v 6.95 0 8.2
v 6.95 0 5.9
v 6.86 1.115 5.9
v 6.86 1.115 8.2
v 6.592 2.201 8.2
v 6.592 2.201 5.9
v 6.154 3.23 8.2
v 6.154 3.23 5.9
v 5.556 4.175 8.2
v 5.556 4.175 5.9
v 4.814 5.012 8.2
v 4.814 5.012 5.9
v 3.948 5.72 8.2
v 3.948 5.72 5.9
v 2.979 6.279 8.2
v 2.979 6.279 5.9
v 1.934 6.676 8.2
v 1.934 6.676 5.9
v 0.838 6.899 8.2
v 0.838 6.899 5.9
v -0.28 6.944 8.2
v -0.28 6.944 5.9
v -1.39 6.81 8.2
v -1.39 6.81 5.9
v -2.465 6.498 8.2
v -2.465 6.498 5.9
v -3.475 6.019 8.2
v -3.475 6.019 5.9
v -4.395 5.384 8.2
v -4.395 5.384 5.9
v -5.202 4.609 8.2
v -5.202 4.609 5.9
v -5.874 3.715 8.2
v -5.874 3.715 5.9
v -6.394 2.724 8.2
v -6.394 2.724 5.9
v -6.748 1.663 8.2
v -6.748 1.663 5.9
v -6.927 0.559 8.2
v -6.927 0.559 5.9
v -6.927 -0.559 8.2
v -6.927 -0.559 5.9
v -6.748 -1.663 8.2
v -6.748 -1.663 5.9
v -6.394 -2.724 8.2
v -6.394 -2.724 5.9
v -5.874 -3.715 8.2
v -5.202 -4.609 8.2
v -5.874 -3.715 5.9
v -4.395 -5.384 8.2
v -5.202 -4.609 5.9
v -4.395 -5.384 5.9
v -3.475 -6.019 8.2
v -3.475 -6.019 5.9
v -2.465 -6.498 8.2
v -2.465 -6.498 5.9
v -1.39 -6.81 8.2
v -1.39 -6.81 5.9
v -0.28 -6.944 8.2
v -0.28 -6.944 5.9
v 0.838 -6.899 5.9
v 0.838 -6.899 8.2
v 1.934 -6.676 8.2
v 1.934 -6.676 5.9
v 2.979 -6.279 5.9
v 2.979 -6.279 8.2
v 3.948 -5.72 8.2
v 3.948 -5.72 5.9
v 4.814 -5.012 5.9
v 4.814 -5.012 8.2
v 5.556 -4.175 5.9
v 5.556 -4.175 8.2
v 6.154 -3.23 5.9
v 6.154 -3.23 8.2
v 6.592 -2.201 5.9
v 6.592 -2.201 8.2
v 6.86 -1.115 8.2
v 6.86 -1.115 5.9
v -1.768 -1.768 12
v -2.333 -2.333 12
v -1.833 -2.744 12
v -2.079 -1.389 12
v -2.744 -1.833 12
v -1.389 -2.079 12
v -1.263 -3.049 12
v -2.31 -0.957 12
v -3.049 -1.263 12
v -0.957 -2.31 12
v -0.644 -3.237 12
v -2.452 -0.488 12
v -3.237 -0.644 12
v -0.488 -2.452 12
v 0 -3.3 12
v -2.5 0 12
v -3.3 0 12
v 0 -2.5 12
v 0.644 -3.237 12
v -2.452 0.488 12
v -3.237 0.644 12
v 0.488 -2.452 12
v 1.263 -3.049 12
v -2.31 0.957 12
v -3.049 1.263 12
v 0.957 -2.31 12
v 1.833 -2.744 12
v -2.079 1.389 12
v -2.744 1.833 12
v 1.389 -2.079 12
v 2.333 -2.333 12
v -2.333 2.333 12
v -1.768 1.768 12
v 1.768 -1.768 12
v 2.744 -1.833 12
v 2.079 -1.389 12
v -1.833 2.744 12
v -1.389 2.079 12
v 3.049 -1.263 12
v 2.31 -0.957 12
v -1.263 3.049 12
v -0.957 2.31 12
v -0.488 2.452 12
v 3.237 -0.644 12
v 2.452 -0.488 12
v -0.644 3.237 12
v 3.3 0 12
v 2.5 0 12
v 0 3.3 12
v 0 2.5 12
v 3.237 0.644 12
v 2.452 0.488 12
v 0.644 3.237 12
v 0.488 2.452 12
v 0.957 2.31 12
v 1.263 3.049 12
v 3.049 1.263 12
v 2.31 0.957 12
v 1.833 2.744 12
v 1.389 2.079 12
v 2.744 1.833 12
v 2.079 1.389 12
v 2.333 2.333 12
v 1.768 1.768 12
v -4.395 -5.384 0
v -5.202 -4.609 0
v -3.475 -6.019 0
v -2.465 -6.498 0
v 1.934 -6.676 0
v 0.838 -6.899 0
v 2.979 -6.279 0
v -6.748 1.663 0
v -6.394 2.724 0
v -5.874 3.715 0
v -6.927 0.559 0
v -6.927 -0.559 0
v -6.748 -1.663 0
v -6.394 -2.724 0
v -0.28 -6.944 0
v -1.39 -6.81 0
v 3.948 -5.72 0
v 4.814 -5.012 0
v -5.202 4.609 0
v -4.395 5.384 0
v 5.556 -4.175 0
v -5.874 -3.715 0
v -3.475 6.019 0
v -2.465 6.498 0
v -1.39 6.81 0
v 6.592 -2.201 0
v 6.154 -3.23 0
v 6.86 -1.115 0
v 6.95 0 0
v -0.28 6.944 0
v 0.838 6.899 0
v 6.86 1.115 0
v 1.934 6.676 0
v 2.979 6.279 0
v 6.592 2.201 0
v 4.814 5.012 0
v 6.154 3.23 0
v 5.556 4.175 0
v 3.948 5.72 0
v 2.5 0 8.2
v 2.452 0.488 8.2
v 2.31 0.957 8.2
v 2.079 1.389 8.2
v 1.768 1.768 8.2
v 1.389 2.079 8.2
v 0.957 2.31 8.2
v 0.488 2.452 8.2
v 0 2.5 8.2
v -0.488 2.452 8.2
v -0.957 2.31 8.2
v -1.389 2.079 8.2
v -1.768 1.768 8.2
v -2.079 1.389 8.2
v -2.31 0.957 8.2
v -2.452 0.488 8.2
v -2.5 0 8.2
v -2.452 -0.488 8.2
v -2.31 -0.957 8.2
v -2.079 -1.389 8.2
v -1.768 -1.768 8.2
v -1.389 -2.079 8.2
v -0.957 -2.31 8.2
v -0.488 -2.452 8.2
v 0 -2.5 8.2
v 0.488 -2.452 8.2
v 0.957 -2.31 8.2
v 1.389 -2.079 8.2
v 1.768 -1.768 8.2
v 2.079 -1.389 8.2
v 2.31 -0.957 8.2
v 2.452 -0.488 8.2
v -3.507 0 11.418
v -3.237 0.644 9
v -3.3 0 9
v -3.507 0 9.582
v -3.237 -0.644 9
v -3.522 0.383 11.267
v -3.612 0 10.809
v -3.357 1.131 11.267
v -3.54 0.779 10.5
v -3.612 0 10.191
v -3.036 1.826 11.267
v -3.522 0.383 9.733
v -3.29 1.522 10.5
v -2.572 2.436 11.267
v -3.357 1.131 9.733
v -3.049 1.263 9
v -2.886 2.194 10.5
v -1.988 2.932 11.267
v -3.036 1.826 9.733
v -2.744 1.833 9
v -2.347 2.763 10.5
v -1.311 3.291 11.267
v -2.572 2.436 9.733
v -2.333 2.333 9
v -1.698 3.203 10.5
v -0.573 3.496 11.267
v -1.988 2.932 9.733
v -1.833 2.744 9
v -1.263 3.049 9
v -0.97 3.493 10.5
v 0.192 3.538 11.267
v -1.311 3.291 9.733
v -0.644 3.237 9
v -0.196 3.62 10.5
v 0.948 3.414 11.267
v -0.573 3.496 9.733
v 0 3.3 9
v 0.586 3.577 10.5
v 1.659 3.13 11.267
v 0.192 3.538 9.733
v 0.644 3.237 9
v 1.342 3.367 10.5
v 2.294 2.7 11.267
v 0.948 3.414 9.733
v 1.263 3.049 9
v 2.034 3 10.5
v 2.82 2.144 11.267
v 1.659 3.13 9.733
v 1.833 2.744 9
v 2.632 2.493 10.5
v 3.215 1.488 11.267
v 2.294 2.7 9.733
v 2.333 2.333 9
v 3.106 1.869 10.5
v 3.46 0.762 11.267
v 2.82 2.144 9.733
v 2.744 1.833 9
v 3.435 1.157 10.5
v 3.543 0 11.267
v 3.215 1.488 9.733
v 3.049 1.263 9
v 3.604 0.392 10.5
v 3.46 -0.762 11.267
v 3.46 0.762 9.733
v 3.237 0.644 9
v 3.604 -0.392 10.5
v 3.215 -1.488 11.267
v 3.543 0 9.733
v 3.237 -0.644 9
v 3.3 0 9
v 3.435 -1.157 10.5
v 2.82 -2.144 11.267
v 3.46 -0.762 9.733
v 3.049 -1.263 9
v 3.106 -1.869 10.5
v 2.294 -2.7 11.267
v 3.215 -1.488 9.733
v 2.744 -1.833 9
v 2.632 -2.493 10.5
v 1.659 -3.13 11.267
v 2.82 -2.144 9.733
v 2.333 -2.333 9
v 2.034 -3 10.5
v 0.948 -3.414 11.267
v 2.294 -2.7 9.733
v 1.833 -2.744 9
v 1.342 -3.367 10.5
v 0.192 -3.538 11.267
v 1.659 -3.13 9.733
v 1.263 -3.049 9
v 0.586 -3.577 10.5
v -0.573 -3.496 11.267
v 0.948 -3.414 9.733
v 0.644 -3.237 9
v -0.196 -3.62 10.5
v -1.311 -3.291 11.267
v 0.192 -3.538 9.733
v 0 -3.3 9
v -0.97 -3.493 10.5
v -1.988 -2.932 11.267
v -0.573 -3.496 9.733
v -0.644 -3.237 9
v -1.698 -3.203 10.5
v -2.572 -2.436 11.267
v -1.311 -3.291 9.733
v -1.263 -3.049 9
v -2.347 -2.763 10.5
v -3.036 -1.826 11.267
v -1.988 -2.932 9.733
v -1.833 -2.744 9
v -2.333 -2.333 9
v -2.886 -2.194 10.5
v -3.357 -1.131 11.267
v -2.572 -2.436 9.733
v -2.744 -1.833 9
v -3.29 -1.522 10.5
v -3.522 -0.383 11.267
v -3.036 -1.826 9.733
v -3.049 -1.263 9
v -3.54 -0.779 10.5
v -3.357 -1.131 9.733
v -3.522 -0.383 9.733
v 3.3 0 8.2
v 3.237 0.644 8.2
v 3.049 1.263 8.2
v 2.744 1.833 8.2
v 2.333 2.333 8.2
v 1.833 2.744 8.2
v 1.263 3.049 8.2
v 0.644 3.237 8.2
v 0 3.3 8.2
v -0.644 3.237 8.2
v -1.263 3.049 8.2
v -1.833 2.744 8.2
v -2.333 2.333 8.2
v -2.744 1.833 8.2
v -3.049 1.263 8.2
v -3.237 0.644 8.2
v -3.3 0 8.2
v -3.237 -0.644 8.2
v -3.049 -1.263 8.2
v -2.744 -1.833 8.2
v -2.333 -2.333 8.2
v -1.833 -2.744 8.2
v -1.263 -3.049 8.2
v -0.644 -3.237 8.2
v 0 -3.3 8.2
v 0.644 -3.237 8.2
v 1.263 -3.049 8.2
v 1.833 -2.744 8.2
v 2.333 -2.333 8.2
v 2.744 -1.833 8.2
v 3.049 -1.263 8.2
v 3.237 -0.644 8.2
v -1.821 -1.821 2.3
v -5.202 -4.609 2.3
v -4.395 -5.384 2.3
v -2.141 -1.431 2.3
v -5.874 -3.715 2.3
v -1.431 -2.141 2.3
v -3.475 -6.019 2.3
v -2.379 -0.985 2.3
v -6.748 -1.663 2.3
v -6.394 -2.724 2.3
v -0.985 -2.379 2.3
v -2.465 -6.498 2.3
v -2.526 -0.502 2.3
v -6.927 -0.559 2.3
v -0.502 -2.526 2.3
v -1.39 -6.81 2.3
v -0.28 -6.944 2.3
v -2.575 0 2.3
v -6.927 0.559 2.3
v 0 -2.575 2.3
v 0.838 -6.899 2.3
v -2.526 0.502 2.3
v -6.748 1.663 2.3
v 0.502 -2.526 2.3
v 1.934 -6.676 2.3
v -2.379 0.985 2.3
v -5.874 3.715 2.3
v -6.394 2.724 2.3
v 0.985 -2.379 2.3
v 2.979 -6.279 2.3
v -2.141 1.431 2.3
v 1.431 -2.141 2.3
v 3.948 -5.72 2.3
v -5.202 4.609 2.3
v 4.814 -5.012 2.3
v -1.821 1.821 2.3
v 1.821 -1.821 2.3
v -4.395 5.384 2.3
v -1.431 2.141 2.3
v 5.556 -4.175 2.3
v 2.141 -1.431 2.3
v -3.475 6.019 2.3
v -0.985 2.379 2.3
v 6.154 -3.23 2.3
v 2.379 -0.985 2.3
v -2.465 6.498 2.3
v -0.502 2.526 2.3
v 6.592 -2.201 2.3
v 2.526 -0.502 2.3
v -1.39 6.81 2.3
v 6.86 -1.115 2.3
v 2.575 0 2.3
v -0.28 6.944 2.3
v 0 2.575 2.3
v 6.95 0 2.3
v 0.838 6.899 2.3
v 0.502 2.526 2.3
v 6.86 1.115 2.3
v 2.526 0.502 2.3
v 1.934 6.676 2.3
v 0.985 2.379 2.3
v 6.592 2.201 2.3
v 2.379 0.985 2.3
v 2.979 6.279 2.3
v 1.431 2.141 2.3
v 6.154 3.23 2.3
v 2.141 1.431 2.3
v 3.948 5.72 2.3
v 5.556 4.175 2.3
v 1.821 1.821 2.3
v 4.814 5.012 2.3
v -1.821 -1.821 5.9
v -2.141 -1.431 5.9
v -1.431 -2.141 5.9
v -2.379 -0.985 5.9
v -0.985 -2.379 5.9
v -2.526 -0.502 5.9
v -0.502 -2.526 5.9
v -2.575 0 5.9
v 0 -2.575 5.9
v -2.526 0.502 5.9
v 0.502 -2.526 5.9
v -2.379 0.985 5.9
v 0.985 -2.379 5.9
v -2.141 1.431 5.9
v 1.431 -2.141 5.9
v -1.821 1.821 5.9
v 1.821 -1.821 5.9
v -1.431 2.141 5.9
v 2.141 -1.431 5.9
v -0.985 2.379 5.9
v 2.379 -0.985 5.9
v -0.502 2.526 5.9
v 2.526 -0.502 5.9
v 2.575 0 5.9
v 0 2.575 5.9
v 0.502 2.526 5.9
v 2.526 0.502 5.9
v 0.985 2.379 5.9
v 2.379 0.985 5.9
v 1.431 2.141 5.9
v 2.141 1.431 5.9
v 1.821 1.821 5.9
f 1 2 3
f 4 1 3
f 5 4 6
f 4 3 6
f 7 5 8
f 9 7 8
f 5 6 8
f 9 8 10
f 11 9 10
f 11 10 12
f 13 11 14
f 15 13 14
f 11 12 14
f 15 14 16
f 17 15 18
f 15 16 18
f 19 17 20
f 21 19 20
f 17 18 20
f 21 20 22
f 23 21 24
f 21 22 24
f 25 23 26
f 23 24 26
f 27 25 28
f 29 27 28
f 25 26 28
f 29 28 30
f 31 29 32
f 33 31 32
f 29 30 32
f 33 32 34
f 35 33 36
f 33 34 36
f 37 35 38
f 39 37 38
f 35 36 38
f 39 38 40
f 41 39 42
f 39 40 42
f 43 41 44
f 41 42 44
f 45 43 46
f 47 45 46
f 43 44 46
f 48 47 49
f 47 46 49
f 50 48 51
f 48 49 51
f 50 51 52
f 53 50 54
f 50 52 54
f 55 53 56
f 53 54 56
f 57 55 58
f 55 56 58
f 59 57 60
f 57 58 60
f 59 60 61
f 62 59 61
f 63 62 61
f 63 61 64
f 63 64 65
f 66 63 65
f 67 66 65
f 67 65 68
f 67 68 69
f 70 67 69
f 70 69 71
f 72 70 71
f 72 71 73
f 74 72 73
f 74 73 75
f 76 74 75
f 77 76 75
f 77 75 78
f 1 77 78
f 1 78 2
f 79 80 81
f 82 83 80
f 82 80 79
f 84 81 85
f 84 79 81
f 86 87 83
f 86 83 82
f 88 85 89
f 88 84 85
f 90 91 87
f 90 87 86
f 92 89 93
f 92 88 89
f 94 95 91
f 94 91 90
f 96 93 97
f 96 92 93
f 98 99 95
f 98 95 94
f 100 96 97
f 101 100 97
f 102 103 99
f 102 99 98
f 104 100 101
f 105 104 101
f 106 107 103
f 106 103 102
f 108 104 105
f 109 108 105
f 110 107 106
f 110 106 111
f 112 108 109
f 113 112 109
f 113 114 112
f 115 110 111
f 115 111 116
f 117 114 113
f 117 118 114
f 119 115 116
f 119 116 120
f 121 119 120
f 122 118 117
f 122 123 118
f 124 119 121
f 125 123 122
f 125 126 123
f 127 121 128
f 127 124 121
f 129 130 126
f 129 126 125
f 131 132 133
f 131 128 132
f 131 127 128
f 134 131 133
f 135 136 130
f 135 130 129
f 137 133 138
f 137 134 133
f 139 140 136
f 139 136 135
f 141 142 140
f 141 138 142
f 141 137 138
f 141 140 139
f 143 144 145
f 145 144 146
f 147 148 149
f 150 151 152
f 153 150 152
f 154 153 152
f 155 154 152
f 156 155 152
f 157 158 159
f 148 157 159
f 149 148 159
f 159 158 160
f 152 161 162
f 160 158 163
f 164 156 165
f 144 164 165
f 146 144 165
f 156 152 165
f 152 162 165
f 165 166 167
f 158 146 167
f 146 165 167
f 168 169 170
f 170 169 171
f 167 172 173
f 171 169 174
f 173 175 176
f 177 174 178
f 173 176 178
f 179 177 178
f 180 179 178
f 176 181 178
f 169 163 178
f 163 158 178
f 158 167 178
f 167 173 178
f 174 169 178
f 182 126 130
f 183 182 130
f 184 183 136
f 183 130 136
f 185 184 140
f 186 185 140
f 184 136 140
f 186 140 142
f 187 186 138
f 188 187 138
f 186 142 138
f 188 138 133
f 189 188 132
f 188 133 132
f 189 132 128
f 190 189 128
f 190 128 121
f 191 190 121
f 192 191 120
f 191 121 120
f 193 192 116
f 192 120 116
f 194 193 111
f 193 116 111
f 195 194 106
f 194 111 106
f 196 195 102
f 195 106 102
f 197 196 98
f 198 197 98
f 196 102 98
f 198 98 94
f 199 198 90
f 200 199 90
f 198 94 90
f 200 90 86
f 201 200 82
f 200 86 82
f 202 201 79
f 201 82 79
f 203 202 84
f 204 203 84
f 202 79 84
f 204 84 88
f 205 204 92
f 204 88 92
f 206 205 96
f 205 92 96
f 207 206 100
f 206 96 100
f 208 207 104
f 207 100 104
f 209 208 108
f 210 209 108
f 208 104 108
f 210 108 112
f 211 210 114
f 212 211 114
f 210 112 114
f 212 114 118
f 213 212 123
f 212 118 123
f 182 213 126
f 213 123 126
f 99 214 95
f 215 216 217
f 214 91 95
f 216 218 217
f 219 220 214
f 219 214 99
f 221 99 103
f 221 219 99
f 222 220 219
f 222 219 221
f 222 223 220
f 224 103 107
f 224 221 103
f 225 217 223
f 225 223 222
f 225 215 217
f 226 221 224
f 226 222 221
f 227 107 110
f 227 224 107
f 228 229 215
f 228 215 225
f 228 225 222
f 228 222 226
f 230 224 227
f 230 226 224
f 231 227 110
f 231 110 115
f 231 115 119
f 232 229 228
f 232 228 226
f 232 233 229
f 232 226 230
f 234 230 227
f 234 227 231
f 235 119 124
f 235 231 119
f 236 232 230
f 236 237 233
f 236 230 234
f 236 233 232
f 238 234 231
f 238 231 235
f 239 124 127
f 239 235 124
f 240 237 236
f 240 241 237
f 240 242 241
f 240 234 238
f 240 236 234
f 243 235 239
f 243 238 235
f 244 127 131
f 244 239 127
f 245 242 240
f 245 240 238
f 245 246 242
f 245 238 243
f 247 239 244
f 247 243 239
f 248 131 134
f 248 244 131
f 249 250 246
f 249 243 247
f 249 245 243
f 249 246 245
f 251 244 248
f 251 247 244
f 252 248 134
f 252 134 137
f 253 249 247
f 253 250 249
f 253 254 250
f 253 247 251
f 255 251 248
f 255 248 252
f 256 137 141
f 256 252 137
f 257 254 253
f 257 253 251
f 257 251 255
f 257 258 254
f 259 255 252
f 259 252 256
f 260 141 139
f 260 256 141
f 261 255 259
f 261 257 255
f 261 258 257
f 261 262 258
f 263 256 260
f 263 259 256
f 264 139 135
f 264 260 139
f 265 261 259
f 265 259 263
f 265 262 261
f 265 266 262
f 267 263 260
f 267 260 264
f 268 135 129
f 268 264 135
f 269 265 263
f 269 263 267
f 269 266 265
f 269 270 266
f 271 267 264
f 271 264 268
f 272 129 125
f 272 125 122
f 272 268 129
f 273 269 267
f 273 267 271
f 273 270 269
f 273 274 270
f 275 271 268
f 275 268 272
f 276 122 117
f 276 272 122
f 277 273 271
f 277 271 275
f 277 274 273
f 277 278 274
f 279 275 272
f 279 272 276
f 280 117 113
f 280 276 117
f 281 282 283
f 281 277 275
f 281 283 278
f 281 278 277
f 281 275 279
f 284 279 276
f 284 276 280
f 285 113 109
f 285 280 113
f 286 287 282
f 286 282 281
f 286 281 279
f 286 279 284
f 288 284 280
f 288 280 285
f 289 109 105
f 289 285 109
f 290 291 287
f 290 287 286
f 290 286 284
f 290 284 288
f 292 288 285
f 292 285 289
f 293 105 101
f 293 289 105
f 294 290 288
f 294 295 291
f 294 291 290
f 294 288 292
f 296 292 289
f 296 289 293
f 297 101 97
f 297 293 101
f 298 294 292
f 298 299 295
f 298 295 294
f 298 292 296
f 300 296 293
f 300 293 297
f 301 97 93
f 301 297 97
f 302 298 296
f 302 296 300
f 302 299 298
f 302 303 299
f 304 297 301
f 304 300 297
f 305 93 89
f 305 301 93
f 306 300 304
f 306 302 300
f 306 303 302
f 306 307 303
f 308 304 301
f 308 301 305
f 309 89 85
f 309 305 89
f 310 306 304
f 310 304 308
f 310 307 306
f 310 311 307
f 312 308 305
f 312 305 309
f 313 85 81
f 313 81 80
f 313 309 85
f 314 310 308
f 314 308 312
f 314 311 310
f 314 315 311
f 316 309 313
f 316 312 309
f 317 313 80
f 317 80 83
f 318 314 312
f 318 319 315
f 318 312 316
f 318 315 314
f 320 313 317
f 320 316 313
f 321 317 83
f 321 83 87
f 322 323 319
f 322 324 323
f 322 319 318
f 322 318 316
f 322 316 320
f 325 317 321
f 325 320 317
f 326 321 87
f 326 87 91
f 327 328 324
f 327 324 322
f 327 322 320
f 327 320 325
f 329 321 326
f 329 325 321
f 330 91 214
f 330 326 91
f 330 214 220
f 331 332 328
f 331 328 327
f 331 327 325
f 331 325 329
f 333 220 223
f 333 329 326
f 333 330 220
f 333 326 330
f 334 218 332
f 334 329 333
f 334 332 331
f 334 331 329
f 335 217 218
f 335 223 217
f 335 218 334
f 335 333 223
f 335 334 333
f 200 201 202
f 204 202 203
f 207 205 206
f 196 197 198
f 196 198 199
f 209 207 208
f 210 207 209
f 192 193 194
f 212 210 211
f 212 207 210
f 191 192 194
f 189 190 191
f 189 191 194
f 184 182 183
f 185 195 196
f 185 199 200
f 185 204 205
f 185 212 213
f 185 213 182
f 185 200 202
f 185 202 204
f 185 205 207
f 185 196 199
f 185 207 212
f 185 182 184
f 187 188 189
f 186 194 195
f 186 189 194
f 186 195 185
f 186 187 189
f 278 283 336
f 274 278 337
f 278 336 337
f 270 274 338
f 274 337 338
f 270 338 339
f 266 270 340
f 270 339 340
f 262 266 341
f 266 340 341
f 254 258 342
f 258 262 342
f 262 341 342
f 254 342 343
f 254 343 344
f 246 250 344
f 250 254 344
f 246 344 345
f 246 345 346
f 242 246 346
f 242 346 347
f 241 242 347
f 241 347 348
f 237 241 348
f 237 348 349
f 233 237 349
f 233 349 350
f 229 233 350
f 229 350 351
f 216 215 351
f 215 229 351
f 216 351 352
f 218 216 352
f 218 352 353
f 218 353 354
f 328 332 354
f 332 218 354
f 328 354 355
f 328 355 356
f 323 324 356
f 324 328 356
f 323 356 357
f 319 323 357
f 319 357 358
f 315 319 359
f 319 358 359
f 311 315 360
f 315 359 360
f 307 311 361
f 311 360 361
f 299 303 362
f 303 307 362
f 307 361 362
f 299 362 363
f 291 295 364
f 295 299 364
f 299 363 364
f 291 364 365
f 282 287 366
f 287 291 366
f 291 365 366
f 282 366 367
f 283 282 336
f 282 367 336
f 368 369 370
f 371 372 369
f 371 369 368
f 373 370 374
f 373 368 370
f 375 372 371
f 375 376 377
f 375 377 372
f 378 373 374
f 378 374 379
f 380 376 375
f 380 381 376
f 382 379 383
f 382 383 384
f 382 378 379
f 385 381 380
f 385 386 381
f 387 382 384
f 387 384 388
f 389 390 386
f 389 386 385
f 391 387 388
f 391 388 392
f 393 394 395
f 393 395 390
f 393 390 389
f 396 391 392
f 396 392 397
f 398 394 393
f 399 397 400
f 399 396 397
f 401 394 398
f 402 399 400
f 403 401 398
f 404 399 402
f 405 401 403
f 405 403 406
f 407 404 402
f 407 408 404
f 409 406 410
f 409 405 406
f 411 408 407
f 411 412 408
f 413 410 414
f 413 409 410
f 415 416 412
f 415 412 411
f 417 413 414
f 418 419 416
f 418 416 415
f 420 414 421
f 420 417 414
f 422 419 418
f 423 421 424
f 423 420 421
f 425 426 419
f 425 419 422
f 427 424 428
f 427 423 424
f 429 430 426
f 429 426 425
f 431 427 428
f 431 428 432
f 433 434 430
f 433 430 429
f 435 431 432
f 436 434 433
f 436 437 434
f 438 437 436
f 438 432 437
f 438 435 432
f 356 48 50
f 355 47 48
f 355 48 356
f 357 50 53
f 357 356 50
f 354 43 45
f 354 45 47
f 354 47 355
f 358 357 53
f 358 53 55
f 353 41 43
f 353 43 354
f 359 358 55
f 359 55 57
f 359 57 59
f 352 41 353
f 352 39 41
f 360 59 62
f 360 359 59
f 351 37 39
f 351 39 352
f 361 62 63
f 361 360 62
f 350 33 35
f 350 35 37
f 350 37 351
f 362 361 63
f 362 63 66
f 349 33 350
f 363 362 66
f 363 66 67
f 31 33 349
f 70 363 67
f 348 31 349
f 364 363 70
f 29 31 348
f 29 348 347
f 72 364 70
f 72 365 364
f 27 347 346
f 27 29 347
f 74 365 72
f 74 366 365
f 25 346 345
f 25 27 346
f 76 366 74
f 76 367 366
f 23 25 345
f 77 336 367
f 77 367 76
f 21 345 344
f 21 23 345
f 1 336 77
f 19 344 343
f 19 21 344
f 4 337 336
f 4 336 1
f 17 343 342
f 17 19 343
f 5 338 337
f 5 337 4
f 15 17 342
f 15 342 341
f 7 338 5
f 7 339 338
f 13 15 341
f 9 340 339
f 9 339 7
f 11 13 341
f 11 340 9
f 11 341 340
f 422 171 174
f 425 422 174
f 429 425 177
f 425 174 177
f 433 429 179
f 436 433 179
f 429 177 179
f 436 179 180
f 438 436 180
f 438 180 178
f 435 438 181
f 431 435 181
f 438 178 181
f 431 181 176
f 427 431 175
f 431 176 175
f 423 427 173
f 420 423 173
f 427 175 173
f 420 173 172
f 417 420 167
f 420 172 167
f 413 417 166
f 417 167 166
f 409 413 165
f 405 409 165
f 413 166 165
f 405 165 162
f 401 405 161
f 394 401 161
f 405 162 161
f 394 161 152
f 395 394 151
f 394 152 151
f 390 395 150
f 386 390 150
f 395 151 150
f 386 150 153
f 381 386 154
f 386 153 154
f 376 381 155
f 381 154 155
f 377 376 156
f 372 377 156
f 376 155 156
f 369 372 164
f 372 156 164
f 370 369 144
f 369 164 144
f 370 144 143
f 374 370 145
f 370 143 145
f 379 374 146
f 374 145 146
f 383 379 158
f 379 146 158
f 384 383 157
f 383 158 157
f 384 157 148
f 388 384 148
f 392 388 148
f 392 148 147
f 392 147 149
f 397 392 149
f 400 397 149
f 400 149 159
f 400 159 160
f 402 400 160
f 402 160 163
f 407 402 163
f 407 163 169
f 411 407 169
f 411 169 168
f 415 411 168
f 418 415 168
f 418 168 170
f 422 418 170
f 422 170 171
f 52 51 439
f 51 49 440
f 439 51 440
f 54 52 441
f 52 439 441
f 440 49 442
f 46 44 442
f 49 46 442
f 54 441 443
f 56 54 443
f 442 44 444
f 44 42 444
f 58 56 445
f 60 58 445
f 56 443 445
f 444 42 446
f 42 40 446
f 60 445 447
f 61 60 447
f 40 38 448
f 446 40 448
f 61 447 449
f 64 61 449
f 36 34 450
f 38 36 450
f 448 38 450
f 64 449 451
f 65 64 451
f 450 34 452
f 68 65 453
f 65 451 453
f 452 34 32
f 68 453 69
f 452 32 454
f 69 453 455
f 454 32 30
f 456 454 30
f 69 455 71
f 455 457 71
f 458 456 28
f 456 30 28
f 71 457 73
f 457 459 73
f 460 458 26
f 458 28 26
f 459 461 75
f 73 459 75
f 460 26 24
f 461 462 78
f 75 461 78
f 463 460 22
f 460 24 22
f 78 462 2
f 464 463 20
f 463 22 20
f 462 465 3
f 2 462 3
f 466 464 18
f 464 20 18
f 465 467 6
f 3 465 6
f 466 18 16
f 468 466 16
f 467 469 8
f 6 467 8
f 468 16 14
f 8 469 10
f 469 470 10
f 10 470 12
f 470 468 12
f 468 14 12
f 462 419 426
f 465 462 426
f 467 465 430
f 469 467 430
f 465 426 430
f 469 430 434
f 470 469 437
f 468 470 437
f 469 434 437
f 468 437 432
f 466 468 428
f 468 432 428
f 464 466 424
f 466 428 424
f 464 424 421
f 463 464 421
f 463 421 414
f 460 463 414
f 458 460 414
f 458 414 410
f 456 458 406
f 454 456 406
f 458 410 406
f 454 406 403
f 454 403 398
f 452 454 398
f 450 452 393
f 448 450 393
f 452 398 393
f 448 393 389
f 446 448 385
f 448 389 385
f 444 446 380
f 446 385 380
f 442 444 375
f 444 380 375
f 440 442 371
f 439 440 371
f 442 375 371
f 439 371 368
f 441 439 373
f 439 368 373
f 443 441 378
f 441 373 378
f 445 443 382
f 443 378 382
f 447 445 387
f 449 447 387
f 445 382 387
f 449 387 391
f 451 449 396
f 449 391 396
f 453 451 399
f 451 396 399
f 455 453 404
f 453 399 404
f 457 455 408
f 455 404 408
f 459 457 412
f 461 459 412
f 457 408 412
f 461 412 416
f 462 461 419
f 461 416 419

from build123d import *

# Parameters (mm, degrees)
F0_R      = 6.95
F1_DEPTH  = 2.3
F2_R      = 2.575
F3_DEPTH  = 3.6
F4_R      = 6.95
F5_DEPTH  = 2.3
F6_R      = 3.3
F7_DEPTH  = 3.8
F10_R     = 2.5
F11_DEPTH = 3.8


with BuildPart() as f1:
    # F0 (on Top) → F1 (new body)
    with BuildSketch(Plane.XY):
        Circle(F0_R)
    extrude(amount=F1_DEPTH)

    # F2 (on face) → F3 (join)
    with BuildSketch(Plane.XY.offset(2.3)):
        Circle(F2_R)
    extrude(amount=F3_DEPTH)

    # F4 (on face) → F5 (join)
    with BuildSketch(Plane.XY.offset(5.9)):
        Circle(F4_R)
    extrude(amount=F5_DEPTH)

    # F6 (on face) → F7 (join)
    with BuildSketch(Plane.XY.offset(8.2)):
        Circle(F6_R)
    extrude(amount=F7_DEPTH)

    # F8 (on Front) → F9 (revolve)
    with BuildSketch(Plane.XZ):
        with BuildLine():
            ThreePointArc((-3.3, 12), (-3.6249137921, 10.5), (-3.3, 9))
            Line((-3.3, 9), (-3.3, 12))
        make_face()
    revolve(axis=Axis((0, 0, 8.2), (0, 0, -1)))

    # F10 (on face) → F11 (cut, through all)
    with BuildSketch(Plane.XY.offset(12)):
        Circle(F10_R)
    extrude(amount=-F11_DEPTH, mode=Mode.SUBTRACT)


solid = f1.part
